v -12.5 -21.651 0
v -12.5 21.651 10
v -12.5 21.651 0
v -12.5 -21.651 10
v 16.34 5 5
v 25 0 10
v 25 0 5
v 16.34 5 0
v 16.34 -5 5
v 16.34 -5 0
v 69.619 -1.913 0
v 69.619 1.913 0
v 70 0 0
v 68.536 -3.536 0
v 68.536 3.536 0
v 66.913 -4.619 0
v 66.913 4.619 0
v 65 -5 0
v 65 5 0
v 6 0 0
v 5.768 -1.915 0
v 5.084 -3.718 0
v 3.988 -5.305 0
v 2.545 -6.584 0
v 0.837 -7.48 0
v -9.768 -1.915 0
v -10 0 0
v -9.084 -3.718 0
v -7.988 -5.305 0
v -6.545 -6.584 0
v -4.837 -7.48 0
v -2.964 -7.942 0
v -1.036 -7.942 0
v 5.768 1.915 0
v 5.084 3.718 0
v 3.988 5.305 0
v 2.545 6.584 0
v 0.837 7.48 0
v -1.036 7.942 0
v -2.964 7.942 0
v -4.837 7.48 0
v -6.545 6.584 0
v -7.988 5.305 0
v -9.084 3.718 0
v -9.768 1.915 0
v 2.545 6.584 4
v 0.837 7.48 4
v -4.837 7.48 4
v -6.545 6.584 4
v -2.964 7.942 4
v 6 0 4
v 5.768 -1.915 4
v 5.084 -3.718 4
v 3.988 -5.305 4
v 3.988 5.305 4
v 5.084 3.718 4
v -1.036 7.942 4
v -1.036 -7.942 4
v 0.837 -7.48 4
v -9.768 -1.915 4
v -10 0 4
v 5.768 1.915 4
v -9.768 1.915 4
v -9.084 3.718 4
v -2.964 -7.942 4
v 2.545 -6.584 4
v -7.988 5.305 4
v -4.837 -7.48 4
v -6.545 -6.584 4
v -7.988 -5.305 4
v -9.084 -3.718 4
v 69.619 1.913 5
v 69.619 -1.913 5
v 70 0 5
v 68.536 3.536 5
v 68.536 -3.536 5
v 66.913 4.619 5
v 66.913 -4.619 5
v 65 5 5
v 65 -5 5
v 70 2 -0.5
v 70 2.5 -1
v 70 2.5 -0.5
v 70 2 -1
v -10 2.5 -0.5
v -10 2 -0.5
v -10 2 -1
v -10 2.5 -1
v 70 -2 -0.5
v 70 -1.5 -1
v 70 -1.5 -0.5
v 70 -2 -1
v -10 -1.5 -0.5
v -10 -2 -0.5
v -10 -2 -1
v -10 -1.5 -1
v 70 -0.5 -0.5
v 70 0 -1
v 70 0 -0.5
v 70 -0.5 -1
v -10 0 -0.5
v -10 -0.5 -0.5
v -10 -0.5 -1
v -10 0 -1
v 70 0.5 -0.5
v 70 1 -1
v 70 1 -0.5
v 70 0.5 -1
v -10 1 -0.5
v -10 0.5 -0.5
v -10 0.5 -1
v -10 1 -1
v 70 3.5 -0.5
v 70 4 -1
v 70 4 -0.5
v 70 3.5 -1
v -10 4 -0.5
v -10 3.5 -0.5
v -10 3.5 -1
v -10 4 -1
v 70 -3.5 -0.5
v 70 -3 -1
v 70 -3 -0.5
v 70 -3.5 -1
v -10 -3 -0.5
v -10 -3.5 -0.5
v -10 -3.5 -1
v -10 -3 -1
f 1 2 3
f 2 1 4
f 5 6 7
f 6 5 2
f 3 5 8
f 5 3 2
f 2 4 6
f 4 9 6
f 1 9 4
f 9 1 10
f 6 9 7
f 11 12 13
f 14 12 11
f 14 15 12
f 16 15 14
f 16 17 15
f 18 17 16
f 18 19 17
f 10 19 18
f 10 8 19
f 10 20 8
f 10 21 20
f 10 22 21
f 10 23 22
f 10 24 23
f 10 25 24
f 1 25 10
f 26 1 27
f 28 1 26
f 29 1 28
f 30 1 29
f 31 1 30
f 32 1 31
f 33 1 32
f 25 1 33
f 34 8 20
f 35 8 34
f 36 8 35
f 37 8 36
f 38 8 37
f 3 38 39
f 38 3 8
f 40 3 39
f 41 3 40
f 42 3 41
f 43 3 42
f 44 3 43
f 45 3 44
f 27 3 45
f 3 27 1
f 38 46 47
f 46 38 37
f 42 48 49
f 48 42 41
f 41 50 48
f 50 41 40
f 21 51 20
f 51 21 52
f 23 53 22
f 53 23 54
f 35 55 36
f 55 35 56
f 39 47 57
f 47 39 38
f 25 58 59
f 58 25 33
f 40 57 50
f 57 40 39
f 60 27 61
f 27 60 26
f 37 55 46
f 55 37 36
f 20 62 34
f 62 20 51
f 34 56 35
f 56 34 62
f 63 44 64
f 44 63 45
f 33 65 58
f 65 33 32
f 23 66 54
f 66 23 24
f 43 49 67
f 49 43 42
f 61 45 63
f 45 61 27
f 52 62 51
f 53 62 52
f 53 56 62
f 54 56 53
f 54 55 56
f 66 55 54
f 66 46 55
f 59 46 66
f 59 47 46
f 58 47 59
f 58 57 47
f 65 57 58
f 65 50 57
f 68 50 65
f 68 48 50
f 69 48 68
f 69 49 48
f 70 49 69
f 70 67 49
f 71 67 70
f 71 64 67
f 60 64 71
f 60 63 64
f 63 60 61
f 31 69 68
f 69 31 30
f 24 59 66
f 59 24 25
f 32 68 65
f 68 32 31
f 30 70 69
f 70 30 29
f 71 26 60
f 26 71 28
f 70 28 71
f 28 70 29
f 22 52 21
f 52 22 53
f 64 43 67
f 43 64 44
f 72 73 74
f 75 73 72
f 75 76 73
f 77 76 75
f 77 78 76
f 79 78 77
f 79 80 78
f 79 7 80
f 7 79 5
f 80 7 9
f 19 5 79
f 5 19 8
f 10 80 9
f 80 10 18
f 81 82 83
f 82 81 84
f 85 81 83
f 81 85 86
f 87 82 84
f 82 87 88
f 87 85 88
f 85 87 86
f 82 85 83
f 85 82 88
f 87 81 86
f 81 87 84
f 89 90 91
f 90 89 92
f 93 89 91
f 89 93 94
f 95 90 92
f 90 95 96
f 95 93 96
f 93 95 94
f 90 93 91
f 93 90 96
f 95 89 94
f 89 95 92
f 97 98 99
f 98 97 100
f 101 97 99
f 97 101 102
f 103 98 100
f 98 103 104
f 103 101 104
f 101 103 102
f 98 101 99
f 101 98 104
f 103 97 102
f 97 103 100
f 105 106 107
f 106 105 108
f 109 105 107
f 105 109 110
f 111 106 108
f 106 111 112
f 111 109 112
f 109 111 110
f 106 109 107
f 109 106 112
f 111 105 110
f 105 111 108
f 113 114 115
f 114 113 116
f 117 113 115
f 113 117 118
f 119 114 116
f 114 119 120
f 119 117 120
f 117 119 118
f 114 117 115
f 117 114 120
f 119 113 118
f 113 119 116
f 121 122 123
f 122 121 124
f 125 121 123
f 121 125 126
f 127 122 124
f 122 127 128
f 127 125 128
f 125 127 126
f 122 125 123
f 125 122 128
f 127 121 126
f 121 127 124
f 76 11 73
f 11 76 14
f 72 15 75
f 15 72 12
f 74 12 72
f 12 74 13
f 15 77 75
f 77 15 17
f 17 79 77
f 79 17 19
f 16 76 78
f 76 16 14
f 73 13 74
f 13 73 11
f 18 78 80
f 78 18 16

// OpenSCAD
difference () {
cylinder (10,25,25, $fn=3) ;
translate ([-2,0,-1])cylinder (5,8,8) ;
}
translate ([15,-5,-0])cube ([50,10,5]) ;
translate ([-10,2,-1])cube ([80,0.5,0.5]) ;
translate ([-10,-2,-1])cube ([80,0.5,0.5]) ;
translate ([-10,-0.5,-1])cube ([80,0.5,0.5]) ;
translate ([-10,0.5,-1])cube ([80,0.5,0.5]) ;
translate ([-10,3.5,-1])cube ([80,0.5,0.5]) ;
translate ([-10,-3.5,-1])cube ([80,0.5,0.5]) ;

translate ([65,0,0])cylinder (5,5,5) ;
